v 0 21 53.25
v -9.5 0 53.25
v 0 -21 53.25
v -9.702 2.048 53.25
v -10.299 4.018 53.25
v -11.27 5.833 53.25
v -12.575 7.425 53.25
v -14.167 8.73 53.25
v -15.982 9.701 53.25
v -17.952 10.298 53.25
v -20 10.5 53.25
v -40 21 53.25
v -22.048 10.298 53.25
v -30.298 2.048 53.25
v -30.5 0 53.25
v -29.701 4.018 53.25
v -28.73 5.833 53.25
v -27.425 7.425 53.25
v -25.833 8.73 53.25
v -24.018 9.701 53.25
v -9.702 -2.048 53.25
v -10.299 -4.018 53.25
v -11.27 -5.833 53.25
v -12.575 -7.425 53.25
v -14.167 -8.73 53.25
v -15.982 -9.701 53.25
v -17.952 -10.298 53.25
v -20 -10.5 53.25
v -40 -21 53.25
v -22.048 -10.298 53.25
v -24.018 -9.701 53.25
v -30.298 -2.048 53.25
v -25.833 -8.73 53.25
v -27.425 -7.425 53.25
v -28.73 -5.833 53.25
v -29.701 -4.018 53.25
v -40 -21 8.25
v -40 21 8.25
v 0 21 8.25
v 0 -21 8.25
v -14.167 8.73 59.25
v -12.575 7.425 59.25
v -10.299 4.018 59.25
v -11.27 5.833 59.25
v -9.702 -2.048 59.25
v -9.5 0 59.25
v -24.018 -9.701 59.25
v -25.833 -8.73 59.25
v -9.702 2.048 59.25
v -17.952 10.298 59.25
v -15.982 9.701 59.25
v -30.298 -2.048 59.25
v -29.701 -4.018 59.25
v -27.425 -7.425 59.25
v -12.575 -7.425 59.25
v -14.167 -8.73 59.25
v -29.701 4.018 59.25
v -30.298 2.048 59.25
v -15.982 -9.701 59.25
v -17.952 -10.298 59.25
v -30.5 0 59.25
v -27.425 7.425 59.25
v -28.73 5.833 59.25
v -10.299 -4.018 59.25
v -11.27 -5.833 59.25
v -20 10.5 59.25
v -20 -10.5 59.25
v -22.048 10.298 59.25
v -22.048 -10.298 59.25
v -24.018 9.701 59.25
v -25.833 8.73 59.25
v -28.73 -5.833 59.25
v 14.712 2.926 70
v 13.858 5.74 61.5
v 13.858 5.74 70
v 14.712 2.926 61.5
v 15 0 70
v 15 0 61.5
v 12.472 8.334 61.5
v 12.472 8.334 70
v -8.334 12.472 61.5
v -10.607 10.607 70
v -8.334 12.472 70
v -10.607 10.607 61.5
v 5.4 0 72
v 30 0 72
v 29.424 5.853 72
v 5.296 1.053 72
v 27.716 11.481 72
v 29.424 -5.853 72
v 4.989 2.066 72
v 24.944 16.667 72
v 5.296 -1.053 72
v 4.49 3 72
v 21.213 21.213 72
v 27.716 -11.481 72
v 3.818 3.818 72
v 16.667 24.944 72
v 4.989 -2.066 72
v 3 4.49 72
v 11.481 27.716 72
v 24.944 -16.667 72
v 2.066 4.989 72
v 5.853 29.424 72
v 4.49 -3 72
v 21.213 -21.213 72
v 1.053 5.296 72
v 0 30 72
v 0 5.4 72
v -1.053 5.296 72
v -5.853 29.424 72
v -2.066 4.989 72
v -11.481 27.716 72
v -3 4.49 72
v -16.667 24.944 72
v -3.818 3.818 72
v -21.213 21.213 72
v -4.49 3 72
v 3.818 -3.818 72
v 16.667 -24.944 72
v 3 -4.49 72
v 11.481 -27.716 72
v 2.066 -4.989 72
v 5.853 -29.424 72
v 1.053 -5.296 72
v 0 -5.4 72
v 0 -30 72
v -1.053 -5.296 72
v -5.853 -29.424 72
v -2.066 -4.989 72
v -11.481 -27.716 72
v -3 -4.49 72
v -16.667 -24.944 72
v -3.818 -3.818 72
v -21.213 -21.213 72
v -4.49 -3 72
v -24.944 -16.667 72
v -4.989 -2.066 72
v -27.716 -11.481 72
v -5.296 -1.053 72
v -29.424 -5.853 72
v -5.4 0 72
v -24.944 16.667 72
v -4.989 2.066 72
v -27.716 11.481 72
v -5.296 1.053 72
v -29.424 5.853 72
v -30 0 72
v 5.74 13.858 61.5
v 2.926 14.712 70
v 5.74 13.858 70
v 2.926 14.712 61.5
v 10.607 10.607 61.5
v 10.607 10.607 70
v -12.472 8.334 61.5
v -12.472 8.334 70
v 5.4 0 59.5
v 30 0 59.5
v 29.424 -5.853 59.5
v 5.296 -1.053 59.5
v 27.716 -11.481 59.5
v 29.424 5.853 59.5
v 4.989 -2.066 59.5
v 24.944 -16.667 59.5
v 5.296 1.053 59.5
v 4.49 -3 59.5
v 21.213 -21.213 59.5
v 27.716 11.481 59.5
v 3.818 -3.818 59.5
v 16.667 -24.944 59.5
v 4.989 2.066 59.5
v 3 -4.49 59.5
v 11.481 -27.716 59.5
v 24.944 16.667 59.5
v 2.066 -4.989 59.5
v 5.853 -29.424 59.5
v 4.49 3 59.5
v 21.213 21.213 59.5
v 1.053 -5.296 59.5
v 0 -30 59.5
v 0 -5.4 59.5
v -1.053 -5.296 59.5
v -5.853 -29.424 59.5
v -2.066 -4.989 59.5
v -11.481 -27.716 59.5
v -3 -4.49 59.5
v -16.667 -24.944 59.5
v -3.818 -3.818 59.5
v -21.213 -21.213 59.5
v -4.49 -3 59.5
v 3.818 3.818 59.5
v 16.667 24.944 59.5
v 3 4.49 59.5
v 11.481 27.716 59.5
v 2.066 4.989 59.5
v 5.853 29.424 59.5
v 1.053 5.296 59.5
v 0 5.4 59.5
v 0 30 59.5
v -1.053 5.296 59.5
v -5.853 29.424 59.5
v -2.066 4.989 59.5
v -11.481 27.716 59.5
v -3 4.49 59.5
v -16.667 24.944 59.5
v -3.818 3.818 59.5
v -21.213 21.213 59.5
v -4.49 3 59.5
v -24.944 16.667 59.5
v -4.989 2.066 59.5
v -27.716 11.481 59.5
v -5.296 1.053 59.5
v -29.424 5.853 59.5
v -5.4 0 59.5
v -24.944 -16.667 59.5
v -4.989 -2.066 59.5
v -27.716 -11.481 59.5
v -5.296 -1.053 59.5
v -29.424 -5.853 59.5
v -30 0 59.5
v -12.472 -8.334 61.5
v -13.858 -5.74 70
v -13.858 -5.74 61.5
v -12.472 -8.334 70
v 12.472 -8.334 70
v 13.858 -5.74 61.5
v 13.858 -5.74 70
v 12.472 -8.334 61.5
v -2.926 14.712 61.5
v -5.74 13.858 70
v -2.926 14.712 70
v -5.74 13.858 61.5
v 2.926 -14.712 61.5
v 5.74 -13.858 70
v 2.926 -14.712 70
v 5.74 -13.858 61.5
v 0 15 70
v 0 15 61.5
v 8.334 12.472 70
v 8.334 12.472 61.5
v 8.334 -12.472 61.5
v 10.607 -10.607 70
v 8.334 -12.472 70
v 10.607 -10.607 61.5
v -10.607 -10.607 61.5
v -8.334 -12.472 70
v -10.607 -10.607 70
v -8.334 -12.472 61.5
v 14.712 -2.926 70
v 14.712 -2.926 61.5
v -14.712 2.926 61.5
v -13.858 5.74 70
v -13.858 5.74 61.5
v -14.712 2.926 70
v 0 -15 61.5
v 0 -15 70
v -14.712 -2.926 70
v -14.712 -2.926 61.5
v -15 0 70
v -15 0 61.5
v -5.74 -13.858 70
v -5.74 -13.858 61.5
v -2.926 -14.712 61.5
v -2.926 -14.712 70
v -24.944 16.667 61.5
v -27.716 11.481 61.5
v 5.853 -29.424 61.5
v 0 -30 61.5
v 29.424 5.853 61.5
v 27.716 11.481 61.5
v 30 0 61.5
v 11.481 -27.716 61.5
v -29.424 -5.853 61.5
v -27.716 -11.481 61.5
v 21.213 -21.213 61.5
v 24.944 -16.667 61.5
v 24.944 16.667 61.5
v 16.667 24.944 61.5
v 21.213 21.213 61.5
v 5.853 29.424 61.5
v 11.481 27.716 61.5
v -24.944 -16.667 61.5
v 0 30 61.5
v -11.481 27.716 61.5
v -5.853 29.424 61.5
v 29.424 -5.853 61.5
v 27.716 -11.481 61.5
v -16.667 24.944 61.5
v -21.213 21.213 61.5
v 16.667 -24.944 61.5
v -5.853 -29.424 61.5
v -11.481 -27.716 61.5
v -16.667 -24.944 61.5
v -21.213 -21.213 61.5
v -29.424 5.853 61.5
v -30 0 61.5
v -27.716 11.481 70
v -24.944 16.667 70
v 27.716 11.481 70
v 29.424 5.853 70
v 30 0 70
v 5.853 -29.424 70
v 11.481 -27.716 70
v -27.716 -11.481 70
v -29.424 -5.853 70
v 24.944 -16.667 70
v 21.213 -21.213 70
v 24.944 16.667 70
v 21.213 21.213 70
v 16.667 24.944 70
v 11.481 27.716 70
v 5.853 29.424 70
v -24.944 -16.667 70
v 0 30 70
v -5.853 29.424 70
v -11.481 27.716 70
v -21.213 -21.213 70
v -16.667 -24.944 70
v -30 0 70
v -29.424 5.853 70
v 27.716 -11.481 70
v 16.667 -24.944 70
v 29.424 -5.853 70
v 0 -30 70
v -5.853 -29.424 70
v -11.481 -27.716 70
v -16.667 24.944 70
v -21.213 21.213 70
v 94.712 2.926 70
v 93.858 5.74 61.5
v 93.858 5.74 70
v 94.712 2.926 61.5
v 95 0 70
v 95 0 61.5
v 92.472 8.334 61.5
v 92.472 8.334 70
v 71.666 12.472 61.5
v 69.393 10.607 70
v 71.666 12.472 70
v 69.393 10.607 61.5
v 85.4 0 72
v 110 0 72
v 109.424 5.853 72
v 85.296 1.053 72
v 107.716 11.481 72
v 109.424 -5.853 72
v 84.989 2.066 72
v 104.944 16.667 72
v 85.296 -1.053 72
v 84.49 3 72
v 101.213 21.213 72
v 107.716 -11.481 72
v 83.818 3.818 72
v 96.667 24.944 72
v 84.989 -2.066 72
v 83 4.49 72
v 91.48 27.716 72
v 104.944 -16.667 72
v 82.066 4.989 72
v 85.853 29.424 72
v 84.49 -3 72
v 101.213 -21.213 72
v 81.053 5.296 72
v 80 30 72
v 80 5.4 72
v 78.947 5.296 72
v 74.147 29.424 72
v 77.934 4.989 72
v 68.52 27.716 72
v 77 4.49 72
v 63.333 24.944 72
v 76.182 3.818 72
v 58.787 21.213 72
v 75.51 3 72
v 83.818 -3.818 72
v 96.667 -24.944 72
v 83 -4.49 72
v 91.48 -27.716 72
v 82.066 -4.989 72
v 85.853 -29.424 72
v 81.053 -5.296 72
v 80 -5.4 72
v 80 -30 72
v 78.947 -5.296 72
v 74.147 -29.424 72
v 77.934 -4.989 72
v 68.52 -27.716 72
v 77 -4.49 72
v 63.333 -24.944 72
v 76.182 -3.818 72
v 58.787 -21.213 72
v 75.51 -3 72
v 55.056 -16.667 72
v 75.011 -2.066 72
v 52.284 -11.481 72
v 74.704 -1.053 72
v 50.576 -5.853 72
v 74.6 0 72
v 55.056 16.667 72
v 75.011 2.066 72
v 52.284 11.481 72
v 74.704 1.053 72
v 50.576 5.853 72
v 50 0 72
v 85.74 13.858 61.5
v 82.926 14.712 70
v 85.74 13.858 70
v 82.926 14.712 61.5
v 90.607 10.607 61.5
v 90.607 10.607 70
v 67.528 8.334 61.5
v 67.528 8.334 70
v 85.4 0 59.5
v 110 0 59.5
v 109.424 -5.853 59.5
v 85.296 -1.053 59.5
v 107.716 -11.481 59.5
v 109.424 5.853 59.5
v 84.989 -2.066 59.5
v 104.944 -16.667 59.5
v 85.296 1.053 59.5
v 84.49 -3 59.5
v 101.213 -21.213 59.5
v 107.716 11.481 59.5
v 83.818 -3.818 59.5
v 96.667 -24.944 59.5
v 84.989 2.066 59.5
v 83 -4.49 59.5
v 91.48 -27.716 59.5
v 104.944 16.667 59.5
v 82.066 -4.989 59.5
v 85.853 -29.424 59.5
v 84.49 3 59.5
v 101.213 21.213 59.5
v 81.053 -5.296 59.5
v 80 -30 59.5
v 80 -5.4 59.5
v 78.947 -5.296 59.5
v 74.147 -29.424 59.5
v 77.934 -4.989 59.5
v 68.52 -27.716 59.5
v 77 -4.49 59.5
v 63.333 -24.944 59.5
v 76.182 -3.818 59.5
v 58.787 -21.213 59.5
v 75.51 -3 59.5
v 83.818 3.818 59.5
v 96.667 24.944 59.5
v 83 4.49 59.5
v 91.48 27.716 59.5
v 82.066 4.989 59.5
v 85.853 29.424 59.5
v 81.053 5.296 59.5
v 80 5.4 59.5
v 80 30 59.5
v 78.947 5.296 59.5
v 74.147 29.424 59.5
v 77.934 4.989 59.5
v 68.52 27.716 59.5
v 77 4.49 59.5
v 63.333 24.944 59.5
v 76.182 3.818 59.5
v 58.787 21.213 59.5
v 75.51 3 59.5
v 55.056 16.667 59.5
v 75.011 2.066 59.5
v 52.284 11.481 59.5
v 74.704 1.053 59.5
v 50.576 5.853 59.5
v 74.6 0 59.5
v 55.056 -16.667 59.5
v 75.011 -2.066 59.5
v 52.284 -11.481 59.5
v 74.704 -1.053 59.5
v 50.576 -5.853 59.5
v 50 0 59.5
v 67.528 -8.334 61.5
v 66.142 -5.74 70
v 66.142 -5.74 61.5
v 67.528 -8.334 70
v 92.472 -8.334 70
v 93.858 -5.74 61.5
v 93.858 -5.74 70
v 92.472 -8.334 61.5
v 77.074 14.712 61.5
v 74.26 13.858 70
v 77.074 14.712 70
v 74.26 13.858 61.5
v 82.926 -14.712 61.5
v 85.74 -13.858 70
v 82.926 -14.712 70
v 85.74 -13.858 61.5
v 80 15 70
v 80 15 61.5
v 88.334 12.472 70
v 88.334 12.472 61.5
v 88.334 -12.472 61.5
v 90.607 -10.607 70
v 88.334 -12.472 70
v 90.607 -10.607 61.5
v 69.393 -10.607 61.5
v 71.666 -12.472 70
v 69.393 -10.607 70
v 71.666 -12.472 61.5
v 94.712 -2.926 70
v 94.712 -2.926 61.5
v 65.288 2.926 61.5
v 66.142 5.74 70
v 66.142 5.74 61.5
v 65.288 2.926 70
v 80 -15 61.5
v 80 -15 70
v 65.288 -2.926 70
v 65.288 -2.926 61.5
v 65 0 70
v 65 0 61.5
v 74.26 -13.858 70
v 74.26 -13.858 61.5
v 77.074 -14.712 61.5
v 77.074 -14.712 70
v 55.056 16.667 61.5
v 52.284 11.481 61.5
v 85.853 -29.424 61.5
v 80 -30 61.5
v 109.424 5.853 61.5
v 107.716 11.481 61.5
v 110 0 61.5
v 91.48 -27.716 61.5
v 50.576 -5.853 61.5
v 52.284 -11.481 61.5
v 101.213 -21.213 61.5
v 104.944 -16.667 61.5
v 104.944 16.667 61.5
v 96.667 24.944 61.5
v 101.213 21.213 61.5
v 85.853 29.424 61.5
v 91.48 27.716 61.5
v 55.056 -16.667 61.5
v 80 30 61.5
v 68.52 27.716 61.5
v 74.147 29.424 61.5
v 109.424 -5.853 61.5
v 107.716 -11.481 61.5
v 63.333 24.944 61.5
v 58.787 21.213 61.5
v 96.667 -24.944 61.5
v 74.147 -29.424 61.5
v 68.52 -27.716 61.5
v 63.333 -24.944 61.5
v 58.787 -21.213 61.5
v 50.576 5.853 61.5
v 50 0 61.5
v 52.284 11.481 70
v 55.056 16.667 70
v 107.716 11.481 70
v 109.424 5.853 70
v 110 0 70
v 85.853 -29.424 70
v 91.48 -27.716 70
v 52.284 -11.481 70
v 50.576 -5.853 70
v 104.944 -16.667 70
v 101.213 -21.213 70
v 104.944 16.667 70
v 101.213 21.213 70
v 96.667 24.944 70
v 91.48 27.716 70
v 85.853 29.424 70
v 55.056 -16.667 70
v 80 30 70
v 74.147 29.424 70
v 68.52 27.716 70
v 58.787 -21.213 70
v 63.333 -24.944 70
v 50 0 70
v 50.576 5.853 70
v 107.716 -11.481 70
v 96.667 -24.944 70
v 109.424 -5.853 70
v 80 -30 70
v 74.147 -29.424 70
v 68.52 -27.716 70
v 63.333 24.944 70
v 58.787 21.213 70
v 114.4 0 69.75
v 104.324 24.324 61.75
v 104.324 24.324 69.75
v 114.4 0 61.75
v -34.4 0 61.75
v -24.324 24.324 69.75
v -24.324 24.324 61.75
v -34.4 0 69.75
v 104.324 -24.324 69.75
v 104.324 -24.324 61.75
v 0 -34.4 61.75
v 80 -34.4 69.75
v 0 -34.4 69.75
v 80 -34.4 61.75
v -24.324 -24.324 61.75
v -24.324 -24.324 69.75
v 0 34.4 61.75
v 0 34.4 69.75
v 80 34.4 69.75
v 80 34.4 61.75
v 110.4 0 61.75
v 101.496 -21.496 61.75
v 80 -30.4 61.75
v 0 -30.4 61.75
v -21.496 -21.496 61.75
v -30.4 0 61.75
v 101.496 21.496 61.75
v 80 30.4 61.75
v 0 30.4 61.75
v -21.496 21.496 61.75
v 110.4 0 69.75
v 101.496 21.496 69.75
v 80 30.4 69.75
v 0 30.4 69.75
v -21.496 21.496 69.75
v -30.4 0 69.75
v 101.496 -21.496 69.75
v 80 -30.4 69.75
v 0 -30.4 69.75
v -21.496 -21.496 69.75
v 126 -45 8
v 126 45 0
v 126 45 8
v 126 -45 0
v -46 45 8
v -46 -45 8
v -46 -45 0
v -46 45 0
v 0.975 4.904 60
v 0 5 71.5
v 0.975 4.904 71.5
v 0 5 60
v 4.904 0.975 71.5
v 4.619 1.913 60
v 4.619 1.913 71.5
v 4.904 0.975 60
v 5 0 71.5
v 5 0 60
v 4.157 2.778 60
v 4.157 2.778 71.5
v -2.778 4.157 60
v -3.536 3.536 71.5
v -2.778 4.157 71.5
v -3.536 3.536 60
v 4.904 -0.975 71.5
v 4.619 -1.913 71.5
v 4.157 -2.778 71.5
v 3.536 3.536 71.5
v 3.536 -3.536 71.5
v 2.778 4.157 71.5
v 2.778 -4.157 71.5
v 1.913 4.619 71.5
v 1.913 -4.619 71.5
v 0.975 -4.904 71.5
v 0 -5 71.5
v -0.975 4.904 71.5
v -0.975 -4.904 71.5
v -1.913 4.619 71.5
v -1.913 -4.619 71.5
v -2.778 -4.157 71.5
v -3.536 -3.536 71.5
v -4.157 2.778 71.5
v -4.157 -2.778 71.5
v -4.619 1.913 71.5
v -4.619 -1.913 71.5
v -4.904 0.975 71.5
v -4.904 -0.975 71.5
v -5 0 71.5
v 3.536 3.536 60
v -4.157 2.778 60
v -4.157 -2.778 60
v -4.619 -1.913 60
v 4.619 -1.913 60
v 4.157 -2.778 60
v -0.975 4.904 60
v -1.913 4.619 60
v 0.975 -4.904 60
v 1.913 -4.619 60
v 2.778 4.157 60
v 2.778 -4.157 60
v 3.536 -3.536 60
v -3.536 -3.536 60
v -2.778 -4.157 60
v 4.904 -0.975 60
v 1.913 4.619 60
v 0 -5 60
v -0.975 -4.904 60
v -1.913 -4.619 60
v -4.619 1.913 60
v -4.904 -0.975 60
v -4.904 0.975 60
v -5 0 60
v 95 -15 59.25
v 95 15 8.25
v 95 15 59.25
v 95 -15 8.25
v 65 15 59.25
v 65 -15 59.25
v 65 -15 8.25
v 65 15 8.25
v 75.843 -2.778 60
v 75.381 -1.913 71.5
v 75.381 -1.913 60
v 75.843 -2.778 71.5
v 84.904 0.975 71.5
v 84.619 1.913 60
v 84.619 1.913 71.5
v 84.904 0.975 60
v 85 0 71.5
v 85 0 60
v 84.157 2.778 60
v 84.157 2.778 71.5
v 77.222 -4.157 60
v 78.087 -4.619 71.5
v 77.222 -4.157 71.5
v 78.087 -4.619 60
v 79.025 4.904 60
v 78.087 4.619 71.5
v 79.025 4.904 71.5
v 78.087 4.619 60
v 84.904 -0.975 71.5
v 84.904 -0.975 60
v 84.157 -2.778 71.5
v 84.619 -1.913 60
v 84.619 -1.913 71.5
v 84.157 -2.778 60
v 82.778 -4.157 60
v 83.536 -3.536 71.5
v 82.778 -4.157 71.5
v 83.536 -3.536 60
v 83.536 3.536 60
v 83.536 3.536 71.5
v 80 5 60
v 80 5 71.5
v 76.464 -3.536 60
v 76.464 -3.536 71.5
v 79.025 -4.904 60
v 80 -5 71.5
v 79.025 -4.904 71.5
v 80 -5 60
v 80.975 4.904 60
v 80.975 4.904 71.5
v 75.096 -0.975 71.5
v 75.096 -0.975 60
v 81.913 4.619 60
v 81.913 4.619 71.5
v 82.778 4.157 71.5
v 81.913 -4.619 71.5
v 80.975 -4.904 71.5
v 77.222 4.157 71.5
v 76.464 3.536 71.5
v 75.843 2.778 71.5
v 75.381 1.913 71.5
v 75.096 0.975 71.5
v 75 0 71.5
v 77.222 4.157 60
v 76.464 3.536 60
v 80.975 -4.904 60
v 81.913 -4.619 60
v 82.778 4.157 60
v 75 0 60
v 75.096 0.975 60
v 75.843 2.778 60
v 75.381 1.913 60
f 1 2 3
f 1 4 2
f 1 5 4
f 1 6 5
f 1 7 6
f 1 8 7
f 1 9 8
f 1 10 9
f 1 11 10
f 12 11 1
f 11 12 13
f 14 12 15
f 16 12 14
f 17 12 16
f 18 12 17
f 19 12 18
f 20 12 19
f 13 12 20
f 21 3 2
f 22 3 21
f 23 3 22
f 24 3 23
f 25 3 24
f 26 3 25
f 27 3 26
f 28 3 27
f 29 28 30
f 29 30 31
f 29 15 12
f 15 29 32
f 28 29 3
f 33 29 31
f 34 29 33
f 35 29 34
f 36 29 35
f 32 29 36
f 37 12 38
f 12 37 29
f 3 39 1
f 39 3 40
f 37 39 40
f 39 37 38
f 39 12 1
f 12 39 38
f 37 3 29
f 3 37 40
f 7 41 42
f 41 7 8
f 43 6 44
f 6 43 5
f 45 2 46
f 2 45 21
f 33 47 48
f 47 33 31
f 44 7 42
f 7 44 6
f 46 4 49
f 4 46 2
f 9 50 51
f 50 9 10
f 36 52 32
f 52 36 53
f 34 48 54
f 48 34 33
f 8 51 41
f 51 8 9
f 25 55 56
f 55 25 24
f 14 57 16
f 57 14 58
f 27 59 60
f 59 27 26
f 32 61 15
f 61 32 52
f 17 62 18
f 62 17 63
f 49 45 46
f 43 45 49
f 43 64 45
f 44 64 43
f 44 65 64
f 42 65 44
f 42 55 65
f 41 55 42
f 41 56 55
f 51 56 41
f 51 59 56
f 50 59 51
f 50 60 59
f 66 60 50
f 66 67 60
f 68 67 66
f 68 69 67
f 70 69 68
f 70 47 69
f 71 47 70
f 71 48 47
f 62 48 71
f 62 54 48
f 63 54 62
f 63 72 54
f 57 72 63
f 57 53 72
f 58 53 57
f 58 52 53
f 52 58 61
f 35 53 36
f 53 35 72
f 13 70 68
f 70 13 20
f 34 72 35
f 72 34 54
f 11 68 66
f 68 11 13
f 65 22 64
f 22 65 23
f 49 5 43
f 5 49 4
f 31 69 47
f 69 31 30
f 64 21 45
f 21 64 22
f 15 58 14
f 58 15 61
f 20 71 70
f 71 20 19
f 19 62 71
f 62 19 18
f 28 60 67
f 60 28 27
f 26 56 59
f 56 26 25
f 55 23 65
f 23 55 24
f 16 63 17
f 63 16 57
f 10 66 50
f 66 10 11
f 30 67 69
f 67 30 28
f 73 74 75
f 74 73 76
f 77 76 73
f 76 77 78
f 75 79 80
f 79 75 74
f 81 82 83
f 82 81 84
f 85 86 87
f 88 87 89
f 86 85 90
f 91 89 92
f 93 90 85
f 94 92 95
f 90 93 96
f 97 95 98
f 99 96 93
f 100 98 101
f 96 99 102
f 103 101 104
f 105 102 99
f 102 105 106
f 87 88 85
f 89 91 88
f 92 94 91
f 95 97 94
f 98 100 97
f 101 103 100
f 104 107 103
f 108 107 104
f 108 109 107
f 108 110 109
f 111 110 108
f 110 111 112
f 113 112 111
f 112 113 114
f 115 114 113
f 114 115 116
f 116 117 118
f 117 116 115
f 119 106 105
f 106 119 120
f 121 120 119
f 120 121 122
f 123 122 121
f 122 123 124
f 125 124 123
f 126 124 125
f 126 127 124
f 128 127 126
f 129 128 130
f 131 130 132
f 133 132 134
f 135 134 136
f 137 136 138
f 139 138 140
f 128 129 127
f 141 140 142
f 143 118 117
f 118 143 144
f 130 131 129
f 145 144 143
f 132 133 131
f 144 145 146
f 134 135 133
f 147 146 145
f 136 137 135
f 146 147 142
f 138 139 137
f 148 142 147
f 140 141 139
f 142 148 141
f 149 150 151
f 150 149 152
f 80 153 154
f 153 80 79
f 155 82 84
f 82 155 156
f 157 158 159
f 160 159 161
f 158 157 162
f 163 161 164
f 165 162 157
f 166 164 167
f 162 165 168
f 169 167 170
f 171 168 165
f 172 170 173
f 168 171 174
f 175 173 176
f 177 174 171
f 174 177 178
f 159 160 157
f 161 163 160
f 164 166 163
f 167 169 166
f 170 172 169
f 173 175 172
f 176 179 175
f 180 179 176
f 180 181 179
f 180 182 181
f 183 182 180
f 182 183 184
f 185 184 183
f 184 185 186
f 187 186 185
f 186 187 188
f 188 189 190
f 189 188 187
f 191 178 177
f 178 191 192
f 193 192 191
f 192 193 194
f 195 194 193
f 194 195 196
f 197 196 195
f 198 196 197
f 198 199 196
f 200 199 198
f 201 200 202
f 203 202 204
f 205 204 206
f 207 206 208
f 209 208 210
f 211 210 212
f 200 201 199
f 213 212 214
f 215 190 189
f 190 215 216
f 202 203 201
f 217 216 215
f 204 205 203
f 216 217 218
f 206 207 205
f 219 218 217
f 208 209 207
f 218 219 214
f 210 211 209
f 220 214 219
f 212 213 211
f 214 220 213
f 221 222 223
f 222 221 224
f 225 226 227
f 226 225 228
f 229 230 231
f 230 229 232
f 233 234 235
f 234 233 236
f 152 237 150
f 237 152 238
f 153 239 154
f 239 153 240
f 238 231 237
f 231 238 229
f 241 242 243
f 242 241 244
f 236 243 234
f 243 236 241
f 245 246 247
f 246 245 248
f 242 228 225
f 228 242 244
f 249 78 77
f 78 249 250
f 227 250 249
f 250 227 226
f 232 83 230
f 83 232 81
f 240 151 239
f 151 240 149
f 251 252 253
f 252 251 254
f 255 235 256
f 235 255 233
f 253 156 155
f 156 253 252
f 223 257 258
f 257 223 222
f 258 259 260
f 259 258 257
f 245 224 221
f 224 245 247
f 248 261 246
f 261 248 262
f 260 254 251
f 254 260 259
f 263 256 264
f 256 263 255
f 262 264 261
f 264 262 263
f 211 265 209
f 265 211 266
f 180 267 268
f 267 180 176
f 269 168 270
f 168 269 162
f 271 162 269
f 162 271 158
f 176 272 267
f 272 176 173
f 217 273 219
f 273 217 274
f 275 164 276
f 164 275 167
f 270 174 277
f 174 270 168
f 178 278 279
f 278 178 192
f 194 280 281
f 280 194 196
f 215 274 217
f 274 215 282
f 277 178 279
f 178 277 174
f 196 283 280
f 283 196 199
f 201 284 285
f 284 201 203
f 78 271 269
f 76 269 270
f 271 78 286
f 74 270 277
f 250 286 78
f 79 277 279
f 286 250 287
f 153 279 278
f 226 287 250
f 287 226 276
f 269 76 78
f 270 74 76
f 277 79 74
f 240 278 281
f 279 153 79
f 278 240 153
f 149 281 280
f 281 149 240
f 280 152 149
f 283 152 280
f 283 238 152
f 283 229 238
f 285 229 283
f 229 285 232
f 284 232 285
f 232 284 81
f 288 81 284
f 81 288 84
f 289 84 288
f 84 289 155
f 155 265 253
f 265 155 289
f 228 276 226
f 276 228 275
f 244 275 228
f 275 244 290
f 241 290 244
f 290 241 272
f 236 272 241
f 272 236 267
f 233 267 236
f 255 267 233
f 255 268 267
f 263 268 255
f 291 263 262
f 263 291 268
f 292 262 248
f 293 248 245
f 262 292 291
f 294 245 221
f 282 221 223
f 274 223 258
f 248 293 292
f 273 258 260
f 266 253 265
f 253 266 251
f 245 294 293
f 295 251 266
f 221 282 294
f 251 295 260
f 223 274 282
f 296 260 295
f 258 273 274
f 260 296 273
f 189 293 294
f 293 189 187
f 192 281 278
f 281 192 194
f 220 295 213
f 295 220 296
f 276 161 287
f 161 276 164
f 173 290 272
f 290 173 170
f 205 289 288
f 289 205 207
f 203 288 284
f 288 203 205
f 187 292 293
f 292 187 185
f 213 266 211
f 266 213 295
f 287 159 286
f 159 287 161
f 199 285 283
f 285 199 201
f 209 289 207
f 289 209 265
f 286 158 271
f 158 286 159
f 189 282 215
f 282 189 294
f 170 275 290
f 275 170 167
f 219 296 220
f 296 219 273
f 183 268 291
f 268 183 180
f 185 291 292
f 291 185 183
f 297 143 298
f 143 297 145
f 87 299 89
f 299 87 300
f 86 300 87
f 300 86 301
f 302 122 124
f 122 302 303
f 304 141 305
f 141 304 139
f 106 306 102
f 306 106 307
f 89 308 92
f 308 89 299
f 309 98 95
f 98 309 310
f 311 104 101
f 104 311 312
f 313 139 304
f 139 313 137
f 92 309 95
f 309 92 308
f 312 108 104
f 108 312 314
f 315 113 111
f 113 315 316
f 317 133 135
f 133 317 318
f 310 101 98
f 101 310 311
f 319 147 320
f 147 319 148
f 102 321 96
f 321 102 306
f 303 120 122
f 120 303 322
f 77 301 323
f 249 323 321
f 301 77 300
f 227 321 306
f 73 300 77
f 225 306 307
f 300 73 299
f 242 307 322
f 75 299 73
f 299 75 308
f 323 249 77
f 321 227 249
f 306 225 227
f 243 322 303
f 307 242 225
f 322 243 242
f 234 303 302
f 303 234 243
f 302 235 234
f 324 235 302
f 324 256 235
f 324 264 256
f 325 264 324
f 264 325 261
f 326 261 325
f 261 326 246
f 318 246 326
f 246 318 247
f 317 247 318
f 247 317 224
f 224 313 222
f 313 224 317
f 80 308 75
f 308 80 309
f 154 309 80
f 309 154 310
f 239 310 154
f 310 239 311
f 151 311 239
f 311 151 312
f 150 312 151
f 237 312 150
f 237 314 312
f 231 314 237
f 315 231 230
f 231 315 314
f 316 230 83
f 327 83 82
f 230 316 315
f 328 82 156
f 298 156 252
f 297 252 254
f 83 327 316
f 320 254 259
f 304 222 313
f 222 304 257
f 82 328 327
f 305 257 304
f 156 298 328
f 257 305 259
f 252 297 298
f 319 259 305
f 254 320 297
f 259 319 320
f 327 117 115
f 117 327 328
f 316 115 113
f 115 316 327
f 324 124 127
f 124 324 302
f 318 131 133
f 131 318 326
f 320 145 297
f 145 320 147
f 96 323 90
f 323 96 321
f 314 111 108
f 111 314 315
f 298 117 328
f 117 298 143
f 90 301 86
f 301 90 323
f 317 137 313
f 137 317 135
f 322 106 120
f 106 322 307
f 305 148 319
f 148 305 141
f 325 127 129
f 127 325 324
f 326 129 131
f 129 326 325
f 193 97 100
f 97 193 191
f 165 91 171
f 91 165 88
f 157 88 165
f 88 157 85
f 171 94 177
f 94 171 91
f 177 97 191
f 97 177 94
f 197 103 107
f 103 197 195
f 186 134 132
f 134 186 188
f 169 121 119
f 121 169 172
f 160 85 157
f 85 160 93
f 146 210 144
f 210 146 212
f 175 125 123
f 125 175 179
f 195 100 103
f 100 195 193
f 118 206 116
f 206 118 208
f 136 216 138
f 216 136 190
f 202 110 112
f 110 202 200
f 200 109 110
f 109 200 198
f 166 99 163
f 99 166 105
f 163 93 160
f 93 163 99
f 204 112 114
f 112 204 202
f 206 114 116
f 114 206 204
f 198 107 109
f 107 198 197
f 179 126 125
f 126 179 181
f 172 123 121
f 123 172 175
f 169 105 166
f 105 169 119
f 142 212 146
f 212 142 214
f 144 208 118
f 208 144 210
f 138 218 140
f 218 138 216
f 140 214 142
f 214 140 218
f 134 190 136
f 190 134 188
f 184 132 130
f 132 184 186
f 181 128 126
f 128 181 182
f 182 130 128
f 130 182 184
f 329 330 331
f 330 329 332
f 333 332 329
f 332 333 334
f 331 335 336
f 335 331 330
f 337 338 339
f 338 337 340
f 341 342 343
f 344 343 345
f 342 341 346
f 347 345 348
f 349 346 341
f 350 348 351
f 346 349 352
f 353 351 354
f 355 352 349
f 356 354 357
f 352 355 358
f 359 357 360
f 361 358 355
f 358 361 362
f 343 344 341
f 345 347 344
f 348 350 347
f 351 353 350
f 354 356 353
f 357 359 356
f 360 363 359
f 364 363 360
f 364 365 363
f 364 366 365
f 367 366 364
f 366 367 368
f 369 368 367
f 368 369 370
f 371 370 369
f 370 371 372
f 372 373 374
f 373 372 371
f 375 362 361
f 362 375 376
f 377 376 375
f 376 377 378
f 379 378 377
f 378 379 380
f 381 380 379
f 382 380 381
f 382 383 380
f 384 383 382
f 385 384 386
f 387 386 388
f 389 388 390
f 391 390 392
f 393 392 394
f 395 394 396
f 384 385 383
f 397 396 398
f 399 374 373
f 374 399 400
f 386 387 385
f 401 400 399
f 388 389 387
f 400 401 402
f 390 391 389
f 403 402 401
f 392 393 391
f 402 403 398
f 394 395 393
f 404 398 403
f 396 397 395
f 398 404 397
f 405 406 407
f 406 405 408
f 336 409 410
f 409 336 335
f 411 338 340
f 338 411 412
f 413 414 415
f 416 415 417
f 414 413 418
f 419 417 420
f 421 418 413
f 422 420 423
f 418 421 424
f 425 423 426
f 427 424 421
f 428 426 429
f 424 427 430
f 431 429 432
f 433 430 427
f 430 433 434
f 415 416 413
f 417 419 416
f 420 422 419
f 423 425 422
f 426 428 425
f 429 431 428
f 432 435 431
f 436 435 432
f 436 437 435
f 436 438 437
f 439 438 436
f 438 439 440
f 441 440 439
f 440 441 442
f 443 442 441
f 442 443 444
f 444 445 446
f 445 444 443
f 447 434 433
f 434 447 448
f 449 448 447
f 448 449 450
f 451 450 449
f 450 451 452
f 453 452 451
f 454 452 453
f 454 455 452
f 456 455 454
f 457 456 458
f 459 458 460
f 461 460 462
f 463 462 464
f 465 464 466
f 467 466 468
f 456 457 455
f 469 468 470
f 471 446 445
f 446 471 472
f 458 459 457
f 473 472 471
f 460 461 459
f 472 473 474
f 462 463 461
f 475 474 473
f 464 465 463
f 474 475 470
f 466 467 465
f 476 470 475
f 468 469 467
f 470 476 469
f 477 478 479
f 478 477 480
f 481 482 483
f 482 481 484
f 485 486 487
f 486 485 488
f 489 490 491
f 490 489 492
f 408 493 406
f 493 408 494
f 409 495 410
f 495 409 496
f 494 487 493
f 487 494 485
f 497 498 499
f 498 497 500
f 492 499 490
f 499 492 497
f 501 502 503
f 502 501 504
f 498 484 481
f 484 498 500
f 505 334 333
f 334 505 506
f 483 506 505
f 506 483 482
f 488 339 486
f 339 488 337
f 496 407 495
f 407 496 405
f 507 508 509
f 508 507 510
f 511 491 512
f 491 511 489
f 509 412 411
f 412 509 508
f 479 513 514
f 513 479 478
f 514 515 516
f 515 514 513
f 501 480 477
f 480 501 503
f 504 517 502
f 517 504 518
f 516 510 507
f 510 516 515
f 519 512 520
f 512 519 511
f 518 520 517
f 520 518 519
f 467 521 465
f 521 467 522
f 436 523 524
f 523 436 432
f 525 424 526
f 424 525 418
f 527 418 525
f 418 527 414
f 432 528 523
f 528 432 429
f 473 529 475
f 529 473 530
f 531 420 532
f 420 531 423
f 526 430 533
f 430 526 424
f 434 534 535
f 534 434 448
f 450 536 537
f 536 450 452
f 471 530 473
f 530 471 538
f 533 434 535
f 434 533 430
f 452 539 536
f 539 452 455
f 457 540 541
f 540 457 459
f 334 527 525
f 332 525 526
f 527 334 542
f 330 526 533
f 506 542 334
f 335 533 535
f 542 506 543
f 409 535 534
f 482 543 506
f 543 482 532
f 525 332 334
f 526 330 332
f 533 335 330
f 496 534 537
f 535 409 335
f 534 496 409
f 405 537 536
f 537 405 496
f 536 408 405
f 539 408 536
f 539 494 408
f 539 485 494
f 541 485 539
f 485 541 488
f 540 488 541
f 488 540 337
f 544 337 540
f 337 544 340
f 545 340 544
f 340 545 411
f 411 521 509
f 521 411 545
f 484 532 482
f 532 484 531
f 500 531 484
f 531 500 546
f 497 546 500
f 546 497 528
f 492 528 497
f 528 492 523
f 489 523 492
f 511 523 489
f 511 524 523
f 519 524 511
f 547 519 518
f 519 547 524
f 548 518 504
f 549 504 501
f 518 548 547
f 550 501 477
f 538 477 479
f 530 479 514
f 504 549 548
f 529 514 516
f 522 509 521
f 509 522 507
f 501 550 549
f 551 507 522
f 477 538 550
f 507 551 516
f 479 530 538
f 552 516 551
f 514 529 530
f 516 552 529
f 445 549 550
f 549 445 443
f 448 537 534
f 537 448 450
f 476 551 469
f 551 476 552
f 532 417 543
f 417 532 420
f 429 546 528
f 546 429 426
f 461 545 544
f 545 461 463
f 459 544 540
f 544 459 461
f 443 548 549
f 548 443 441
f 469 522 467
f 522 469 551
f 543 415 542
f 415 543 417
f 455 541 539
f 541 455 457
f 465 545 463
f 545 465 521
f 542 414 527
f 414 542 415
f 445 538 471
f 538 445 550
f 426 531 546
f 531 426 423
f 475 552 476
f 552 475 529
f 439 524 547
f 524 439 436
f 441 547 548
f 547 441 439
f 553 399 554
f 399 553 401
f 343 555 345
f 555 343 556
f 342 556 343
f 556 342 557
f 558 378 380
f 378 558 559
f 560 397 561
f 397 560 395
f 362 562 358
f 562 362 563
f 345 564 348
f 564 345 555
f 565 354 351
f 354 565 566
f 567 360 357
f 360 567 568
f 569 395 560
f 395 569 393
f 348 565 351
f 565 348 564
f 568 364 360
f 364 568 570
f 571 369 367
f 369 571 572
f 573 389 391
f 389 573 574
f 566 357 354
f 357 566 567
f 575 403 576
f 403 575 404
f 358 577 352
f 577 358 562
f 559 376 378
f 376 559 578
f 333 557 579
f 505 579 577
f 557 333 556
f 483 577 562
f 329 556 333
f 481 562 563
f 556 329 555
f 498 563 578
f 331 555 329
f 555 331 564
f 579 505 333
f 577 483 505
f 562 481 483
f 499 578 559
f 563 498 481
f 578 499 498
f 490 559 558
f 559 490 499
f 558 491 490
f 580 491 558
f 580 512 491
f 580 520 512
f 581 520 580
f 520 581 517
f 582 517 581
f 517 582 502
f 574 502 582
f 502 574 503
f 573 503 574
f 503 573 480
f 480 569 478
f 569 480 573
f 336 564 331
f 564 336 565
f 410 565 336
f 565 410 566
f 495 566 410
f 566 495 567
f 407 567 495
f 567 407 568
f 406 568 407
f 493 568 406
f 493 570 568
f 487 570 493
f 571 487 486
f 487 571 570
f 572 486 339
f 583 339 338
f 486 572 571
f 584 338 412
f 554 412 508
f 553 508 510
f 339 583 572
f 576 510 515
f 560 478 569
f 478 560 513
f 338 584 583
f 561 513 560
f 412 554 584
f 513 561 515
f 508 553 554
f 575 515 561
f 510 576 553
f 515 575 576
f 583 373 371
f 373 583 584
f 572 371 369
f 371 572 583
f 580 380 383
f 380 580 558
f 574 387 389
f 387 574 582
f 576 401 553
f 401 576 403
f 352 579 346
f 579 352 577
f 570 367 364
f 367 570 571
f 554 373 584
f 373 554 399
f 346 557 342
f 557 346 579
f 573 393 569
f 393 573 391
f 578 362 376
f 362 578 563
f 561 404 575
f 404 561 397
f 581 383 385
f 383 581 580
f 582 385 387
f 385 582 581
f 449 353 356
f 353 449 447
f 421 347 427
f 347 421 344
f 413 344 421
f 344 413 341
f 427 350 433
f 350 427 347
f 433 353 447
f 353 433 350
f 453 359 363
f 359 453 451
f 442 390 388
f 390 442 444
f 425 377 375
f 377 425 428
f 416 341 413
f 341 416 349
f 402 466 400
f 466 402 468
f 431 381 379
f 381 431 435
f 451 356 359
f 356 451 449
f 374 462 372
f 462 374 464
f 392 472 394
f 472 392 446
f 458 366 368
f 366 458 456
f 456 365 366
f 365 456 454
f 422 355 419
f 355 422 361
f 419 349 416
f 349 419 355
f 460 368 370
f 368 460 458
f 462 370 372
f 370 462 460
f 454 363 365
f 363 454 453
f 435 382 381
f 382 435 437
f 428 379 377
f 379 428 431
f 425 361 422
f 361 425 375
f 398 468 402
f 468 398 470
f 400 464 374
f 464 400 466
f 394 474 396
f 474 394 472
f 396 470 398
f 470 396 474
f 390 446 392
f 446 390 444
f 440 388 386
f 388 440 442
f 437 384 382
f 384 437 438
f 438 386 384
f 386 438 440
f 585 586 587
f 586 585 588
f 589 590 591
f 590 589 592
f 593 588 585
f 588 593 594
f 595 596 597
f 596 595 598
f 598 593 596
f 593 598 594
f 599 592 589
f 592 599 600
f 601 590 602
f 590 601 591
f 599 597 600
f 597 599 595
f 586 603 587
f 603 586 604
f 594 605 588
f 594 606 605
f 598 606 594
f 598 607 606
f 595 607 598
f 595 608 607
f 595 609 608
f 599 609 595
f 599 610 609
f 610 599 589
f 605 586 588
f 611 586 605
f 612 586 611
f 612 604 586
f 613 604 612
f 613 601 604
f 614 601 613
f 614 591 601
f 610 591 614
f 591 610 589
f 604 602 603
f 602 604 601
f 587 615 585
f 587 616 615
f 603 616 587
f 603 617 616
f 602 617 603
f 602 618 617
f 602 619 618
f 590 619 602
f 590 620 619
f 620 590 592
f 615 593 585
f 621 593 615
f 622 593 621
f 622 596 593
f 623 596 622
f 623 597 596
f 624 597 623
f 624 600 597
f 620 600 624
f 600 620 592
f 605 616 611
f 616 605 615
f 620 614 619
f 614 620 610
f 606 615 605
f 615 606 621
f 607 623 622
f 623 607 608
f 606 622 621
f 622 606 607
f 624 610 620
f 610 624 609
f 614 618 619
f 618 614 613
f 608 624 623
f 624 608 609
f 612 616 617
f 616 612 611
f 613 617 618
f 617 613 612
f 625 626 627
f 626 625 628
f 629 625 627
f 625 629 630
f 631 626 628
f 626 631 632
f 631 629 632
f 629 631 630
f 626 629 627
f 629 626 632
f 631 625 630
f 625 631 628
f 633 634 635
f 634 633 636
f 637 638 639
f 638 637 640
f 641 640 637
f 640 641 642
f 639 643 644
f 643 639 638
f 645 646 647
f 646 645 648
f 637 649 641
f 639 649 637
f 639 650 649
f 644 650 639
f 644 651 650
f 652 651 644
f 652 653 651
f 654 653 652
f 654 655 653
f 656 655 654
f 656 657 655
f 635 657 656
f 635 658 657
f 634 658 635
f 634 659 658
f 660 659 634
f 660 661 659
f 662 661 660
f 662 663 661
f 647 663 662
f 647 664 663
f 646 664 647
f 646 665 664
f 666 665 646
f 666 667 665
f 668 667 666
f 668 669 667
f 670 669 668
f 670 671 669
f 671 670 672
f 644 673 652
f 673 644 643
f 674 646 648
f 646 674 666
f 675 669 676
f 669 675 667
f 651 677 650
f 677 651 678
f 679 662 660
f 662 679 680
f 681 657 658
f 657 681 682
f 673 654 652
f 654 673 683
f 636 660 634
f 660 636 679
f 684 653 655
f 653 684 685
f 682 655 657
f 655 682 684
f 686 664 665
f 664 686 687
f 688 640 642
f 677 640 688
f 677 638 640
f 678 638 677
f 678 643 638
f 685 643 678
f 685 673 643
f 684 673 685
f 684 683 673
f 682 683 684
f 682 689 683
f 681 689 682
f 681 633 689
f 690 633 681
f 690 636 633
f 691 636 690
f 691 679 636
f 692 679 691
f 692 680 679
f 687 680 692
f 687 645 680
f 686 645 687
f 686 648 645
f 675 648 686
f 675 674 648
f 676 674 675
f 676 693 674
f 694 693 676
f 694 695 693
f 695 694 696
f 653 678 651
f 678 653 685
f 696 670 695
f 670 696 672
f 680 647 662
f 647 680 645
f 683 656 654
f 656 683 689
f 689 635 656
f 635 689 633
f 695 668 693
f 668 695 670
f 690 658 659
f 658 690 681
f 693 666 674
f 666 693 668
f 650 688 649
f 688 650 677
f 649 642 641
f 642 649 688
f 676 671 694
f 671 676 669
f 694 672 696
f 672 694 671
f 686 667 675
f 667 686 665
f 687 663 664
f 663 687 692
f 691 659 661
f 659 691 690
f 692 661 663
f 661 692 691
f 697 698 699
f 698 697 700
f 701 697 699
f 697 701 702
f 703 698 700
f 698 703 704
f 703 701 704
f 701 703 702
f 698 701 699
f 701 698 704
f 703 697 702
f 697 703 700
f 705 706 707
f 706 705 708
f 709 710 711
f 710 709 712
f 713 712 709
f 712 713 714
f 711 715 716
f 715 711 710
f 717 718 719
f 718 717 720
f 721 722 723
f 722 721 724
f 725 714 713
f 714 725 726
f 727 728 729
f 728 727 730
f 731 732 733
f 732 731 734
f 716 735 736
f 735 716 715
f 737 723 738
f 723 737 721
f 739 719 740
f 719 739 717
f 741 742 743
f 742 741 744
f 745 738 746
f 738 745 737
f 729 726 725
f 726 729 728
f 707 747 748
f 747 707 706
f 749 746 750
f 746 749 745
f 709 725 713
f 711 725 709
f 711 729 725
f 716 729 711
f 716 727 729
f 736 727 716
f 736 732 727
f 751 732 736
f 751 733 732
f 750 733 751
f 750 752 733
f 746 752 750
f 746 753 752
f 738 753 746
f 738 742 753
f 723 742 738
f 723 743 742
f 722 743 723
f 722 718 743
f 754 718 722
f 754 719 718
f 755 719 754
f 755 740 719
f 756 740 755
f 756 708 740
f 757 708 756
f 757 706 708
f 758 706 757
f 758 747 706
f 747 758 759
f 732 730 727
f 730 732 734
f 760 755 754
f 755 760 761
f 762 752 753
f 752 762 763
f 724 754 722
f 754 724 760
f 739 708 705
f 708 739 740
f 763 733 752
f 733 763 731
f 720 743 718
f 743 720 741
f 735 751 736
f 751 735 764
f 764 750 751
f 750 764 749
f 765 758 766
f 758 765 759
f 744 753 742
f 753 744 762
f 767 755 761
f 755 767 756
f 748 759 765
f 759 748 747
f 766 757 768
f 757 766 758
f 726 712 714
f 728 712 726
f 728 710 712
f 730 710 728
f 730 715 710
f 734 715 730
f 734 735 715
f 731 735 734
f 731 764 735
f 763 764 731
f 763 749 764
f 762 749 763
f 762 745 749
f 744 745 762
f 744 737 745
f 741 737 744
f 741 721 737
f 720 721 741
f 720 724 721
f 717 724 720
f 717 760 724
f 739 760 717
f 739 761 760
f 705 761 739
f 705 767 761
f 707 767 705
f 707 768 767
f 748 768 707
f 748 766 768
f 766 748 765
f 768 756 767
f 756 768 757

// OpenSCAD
$fn = 32;

// ------------------------------------------------------------------------
// Motor belt drive: span 80 mm, pulleys d60, belt 8 mm wide
// Every part is its own module, assembly() places every instance.
// ------------------------------------------------------------------------

// --- part 1 ---
module base_plate() {
  difference() {
    translate([-86, -45, 0]) cube([172, 90, 8]);
  }
}

// --- part 2 ---
module motor() {
  union() {
    translate([-22.5, -21, 0]) cube([45, 42, 40]);
    translate([25.5, 0, 20]) rotate([0, 90, 0]) cylinder(h = 6, d = 21, center = true);
  }
}

// --- part 3 ---
module drive_shaft() {
  translate([0, 0, -5.75]) cylinder(h = 11.5, d = 10);
}

// --- part 4 ---
module pulley_drive() {
  difference() {
    union() {
      cylinder(h = 12.5, d = 30);
      cylinder(h = 2, d = 60);
      translate([0, 0, 10.5]) cylinder(h = 2, d = 60);
    }
    translate([0, 0, -1]) cylinder(h = 14.5, d = 10.8);
  }
}

// --- part 5 ---
module idler_post() {
  translate([-15, -15, 0]) cube([30, 30, 51]);
}

// --- part 6 ---
module driven_shaft() {
  translate([0, 0, -5.75]) cylinder(h = 11.5, d = 10);
}

// --- part 7 ---
module pulley_driven() {
  difference() {
    union() {
      cylinder(h = 12.5, d = 30);
      cylinder(h = 2, d = 60);
      translate([0, 0, 10.5]) cylinder(h = 2, d = 60);
    }
    translate([0, 0, -1]) cylinder(h = 14.5, d = 10.8);
  }
}

// --- part 8 ---
module drive_belt() {
  difference() {
    linear_extrude(height = 8) polygon(points = concat([for (a = [90 : 45 : 270]) [34.4 * cos(a), 34.4 * sin(a)]], [for (a = [270 : 45 : 450]) [80 + 34.4 * cos(a), 34.4 * sin(a)]]));
    translate([0, 0, -1]) linear_extrude(height = 10) polygon(points = concat([for (a = [90 : 45 : 270]) [30.4 * cos(a), 30.4 * sin(a)]], [for (a = [270 : 45 : 450]) [80 + 30.4 * cos(a), 30.4 * sin(a)]]));
  }
}

// --- assembly ---
module assembly() {
  color([0.80, 0.24, 0.20]) translate([40, 0, 0]) rotate([0, 0, 0]) base_plate();
  color([0.20, 0.45, 0.75]) translate([0, 0, 30.75]) rotate([0, 270, 0]) motor();
  color([0.25, 0.62, 0.32]) translate([0, 0, 65.75]) rotate([0, 0, 0]) drive_shaft();
  color([0.92, 0.70, 0.18]) translate([0, 0, 59.5]) rotate([0, 0, 0]) pulley_drive();
  color([0.58, 0.35, 0.70]) translate([80, 0, 8.25]) rotate([0, 0, 0]) idler_post();
  color([0.16, 0.66, 0.66]) translate([80, 0, 65.75]) rotate([0, 0, 0]) driven_shaft();
  color([0.85, 0.48, 0.18]) translate([80, 0, 59.5]) rotate([0, 0, 0]) pulley_driven();
  color([0.55, 0.60, 0.65]) translate([0, 0, 61.75]) rotate([0, 0, 0]) drive_belt();
}

assembly();
